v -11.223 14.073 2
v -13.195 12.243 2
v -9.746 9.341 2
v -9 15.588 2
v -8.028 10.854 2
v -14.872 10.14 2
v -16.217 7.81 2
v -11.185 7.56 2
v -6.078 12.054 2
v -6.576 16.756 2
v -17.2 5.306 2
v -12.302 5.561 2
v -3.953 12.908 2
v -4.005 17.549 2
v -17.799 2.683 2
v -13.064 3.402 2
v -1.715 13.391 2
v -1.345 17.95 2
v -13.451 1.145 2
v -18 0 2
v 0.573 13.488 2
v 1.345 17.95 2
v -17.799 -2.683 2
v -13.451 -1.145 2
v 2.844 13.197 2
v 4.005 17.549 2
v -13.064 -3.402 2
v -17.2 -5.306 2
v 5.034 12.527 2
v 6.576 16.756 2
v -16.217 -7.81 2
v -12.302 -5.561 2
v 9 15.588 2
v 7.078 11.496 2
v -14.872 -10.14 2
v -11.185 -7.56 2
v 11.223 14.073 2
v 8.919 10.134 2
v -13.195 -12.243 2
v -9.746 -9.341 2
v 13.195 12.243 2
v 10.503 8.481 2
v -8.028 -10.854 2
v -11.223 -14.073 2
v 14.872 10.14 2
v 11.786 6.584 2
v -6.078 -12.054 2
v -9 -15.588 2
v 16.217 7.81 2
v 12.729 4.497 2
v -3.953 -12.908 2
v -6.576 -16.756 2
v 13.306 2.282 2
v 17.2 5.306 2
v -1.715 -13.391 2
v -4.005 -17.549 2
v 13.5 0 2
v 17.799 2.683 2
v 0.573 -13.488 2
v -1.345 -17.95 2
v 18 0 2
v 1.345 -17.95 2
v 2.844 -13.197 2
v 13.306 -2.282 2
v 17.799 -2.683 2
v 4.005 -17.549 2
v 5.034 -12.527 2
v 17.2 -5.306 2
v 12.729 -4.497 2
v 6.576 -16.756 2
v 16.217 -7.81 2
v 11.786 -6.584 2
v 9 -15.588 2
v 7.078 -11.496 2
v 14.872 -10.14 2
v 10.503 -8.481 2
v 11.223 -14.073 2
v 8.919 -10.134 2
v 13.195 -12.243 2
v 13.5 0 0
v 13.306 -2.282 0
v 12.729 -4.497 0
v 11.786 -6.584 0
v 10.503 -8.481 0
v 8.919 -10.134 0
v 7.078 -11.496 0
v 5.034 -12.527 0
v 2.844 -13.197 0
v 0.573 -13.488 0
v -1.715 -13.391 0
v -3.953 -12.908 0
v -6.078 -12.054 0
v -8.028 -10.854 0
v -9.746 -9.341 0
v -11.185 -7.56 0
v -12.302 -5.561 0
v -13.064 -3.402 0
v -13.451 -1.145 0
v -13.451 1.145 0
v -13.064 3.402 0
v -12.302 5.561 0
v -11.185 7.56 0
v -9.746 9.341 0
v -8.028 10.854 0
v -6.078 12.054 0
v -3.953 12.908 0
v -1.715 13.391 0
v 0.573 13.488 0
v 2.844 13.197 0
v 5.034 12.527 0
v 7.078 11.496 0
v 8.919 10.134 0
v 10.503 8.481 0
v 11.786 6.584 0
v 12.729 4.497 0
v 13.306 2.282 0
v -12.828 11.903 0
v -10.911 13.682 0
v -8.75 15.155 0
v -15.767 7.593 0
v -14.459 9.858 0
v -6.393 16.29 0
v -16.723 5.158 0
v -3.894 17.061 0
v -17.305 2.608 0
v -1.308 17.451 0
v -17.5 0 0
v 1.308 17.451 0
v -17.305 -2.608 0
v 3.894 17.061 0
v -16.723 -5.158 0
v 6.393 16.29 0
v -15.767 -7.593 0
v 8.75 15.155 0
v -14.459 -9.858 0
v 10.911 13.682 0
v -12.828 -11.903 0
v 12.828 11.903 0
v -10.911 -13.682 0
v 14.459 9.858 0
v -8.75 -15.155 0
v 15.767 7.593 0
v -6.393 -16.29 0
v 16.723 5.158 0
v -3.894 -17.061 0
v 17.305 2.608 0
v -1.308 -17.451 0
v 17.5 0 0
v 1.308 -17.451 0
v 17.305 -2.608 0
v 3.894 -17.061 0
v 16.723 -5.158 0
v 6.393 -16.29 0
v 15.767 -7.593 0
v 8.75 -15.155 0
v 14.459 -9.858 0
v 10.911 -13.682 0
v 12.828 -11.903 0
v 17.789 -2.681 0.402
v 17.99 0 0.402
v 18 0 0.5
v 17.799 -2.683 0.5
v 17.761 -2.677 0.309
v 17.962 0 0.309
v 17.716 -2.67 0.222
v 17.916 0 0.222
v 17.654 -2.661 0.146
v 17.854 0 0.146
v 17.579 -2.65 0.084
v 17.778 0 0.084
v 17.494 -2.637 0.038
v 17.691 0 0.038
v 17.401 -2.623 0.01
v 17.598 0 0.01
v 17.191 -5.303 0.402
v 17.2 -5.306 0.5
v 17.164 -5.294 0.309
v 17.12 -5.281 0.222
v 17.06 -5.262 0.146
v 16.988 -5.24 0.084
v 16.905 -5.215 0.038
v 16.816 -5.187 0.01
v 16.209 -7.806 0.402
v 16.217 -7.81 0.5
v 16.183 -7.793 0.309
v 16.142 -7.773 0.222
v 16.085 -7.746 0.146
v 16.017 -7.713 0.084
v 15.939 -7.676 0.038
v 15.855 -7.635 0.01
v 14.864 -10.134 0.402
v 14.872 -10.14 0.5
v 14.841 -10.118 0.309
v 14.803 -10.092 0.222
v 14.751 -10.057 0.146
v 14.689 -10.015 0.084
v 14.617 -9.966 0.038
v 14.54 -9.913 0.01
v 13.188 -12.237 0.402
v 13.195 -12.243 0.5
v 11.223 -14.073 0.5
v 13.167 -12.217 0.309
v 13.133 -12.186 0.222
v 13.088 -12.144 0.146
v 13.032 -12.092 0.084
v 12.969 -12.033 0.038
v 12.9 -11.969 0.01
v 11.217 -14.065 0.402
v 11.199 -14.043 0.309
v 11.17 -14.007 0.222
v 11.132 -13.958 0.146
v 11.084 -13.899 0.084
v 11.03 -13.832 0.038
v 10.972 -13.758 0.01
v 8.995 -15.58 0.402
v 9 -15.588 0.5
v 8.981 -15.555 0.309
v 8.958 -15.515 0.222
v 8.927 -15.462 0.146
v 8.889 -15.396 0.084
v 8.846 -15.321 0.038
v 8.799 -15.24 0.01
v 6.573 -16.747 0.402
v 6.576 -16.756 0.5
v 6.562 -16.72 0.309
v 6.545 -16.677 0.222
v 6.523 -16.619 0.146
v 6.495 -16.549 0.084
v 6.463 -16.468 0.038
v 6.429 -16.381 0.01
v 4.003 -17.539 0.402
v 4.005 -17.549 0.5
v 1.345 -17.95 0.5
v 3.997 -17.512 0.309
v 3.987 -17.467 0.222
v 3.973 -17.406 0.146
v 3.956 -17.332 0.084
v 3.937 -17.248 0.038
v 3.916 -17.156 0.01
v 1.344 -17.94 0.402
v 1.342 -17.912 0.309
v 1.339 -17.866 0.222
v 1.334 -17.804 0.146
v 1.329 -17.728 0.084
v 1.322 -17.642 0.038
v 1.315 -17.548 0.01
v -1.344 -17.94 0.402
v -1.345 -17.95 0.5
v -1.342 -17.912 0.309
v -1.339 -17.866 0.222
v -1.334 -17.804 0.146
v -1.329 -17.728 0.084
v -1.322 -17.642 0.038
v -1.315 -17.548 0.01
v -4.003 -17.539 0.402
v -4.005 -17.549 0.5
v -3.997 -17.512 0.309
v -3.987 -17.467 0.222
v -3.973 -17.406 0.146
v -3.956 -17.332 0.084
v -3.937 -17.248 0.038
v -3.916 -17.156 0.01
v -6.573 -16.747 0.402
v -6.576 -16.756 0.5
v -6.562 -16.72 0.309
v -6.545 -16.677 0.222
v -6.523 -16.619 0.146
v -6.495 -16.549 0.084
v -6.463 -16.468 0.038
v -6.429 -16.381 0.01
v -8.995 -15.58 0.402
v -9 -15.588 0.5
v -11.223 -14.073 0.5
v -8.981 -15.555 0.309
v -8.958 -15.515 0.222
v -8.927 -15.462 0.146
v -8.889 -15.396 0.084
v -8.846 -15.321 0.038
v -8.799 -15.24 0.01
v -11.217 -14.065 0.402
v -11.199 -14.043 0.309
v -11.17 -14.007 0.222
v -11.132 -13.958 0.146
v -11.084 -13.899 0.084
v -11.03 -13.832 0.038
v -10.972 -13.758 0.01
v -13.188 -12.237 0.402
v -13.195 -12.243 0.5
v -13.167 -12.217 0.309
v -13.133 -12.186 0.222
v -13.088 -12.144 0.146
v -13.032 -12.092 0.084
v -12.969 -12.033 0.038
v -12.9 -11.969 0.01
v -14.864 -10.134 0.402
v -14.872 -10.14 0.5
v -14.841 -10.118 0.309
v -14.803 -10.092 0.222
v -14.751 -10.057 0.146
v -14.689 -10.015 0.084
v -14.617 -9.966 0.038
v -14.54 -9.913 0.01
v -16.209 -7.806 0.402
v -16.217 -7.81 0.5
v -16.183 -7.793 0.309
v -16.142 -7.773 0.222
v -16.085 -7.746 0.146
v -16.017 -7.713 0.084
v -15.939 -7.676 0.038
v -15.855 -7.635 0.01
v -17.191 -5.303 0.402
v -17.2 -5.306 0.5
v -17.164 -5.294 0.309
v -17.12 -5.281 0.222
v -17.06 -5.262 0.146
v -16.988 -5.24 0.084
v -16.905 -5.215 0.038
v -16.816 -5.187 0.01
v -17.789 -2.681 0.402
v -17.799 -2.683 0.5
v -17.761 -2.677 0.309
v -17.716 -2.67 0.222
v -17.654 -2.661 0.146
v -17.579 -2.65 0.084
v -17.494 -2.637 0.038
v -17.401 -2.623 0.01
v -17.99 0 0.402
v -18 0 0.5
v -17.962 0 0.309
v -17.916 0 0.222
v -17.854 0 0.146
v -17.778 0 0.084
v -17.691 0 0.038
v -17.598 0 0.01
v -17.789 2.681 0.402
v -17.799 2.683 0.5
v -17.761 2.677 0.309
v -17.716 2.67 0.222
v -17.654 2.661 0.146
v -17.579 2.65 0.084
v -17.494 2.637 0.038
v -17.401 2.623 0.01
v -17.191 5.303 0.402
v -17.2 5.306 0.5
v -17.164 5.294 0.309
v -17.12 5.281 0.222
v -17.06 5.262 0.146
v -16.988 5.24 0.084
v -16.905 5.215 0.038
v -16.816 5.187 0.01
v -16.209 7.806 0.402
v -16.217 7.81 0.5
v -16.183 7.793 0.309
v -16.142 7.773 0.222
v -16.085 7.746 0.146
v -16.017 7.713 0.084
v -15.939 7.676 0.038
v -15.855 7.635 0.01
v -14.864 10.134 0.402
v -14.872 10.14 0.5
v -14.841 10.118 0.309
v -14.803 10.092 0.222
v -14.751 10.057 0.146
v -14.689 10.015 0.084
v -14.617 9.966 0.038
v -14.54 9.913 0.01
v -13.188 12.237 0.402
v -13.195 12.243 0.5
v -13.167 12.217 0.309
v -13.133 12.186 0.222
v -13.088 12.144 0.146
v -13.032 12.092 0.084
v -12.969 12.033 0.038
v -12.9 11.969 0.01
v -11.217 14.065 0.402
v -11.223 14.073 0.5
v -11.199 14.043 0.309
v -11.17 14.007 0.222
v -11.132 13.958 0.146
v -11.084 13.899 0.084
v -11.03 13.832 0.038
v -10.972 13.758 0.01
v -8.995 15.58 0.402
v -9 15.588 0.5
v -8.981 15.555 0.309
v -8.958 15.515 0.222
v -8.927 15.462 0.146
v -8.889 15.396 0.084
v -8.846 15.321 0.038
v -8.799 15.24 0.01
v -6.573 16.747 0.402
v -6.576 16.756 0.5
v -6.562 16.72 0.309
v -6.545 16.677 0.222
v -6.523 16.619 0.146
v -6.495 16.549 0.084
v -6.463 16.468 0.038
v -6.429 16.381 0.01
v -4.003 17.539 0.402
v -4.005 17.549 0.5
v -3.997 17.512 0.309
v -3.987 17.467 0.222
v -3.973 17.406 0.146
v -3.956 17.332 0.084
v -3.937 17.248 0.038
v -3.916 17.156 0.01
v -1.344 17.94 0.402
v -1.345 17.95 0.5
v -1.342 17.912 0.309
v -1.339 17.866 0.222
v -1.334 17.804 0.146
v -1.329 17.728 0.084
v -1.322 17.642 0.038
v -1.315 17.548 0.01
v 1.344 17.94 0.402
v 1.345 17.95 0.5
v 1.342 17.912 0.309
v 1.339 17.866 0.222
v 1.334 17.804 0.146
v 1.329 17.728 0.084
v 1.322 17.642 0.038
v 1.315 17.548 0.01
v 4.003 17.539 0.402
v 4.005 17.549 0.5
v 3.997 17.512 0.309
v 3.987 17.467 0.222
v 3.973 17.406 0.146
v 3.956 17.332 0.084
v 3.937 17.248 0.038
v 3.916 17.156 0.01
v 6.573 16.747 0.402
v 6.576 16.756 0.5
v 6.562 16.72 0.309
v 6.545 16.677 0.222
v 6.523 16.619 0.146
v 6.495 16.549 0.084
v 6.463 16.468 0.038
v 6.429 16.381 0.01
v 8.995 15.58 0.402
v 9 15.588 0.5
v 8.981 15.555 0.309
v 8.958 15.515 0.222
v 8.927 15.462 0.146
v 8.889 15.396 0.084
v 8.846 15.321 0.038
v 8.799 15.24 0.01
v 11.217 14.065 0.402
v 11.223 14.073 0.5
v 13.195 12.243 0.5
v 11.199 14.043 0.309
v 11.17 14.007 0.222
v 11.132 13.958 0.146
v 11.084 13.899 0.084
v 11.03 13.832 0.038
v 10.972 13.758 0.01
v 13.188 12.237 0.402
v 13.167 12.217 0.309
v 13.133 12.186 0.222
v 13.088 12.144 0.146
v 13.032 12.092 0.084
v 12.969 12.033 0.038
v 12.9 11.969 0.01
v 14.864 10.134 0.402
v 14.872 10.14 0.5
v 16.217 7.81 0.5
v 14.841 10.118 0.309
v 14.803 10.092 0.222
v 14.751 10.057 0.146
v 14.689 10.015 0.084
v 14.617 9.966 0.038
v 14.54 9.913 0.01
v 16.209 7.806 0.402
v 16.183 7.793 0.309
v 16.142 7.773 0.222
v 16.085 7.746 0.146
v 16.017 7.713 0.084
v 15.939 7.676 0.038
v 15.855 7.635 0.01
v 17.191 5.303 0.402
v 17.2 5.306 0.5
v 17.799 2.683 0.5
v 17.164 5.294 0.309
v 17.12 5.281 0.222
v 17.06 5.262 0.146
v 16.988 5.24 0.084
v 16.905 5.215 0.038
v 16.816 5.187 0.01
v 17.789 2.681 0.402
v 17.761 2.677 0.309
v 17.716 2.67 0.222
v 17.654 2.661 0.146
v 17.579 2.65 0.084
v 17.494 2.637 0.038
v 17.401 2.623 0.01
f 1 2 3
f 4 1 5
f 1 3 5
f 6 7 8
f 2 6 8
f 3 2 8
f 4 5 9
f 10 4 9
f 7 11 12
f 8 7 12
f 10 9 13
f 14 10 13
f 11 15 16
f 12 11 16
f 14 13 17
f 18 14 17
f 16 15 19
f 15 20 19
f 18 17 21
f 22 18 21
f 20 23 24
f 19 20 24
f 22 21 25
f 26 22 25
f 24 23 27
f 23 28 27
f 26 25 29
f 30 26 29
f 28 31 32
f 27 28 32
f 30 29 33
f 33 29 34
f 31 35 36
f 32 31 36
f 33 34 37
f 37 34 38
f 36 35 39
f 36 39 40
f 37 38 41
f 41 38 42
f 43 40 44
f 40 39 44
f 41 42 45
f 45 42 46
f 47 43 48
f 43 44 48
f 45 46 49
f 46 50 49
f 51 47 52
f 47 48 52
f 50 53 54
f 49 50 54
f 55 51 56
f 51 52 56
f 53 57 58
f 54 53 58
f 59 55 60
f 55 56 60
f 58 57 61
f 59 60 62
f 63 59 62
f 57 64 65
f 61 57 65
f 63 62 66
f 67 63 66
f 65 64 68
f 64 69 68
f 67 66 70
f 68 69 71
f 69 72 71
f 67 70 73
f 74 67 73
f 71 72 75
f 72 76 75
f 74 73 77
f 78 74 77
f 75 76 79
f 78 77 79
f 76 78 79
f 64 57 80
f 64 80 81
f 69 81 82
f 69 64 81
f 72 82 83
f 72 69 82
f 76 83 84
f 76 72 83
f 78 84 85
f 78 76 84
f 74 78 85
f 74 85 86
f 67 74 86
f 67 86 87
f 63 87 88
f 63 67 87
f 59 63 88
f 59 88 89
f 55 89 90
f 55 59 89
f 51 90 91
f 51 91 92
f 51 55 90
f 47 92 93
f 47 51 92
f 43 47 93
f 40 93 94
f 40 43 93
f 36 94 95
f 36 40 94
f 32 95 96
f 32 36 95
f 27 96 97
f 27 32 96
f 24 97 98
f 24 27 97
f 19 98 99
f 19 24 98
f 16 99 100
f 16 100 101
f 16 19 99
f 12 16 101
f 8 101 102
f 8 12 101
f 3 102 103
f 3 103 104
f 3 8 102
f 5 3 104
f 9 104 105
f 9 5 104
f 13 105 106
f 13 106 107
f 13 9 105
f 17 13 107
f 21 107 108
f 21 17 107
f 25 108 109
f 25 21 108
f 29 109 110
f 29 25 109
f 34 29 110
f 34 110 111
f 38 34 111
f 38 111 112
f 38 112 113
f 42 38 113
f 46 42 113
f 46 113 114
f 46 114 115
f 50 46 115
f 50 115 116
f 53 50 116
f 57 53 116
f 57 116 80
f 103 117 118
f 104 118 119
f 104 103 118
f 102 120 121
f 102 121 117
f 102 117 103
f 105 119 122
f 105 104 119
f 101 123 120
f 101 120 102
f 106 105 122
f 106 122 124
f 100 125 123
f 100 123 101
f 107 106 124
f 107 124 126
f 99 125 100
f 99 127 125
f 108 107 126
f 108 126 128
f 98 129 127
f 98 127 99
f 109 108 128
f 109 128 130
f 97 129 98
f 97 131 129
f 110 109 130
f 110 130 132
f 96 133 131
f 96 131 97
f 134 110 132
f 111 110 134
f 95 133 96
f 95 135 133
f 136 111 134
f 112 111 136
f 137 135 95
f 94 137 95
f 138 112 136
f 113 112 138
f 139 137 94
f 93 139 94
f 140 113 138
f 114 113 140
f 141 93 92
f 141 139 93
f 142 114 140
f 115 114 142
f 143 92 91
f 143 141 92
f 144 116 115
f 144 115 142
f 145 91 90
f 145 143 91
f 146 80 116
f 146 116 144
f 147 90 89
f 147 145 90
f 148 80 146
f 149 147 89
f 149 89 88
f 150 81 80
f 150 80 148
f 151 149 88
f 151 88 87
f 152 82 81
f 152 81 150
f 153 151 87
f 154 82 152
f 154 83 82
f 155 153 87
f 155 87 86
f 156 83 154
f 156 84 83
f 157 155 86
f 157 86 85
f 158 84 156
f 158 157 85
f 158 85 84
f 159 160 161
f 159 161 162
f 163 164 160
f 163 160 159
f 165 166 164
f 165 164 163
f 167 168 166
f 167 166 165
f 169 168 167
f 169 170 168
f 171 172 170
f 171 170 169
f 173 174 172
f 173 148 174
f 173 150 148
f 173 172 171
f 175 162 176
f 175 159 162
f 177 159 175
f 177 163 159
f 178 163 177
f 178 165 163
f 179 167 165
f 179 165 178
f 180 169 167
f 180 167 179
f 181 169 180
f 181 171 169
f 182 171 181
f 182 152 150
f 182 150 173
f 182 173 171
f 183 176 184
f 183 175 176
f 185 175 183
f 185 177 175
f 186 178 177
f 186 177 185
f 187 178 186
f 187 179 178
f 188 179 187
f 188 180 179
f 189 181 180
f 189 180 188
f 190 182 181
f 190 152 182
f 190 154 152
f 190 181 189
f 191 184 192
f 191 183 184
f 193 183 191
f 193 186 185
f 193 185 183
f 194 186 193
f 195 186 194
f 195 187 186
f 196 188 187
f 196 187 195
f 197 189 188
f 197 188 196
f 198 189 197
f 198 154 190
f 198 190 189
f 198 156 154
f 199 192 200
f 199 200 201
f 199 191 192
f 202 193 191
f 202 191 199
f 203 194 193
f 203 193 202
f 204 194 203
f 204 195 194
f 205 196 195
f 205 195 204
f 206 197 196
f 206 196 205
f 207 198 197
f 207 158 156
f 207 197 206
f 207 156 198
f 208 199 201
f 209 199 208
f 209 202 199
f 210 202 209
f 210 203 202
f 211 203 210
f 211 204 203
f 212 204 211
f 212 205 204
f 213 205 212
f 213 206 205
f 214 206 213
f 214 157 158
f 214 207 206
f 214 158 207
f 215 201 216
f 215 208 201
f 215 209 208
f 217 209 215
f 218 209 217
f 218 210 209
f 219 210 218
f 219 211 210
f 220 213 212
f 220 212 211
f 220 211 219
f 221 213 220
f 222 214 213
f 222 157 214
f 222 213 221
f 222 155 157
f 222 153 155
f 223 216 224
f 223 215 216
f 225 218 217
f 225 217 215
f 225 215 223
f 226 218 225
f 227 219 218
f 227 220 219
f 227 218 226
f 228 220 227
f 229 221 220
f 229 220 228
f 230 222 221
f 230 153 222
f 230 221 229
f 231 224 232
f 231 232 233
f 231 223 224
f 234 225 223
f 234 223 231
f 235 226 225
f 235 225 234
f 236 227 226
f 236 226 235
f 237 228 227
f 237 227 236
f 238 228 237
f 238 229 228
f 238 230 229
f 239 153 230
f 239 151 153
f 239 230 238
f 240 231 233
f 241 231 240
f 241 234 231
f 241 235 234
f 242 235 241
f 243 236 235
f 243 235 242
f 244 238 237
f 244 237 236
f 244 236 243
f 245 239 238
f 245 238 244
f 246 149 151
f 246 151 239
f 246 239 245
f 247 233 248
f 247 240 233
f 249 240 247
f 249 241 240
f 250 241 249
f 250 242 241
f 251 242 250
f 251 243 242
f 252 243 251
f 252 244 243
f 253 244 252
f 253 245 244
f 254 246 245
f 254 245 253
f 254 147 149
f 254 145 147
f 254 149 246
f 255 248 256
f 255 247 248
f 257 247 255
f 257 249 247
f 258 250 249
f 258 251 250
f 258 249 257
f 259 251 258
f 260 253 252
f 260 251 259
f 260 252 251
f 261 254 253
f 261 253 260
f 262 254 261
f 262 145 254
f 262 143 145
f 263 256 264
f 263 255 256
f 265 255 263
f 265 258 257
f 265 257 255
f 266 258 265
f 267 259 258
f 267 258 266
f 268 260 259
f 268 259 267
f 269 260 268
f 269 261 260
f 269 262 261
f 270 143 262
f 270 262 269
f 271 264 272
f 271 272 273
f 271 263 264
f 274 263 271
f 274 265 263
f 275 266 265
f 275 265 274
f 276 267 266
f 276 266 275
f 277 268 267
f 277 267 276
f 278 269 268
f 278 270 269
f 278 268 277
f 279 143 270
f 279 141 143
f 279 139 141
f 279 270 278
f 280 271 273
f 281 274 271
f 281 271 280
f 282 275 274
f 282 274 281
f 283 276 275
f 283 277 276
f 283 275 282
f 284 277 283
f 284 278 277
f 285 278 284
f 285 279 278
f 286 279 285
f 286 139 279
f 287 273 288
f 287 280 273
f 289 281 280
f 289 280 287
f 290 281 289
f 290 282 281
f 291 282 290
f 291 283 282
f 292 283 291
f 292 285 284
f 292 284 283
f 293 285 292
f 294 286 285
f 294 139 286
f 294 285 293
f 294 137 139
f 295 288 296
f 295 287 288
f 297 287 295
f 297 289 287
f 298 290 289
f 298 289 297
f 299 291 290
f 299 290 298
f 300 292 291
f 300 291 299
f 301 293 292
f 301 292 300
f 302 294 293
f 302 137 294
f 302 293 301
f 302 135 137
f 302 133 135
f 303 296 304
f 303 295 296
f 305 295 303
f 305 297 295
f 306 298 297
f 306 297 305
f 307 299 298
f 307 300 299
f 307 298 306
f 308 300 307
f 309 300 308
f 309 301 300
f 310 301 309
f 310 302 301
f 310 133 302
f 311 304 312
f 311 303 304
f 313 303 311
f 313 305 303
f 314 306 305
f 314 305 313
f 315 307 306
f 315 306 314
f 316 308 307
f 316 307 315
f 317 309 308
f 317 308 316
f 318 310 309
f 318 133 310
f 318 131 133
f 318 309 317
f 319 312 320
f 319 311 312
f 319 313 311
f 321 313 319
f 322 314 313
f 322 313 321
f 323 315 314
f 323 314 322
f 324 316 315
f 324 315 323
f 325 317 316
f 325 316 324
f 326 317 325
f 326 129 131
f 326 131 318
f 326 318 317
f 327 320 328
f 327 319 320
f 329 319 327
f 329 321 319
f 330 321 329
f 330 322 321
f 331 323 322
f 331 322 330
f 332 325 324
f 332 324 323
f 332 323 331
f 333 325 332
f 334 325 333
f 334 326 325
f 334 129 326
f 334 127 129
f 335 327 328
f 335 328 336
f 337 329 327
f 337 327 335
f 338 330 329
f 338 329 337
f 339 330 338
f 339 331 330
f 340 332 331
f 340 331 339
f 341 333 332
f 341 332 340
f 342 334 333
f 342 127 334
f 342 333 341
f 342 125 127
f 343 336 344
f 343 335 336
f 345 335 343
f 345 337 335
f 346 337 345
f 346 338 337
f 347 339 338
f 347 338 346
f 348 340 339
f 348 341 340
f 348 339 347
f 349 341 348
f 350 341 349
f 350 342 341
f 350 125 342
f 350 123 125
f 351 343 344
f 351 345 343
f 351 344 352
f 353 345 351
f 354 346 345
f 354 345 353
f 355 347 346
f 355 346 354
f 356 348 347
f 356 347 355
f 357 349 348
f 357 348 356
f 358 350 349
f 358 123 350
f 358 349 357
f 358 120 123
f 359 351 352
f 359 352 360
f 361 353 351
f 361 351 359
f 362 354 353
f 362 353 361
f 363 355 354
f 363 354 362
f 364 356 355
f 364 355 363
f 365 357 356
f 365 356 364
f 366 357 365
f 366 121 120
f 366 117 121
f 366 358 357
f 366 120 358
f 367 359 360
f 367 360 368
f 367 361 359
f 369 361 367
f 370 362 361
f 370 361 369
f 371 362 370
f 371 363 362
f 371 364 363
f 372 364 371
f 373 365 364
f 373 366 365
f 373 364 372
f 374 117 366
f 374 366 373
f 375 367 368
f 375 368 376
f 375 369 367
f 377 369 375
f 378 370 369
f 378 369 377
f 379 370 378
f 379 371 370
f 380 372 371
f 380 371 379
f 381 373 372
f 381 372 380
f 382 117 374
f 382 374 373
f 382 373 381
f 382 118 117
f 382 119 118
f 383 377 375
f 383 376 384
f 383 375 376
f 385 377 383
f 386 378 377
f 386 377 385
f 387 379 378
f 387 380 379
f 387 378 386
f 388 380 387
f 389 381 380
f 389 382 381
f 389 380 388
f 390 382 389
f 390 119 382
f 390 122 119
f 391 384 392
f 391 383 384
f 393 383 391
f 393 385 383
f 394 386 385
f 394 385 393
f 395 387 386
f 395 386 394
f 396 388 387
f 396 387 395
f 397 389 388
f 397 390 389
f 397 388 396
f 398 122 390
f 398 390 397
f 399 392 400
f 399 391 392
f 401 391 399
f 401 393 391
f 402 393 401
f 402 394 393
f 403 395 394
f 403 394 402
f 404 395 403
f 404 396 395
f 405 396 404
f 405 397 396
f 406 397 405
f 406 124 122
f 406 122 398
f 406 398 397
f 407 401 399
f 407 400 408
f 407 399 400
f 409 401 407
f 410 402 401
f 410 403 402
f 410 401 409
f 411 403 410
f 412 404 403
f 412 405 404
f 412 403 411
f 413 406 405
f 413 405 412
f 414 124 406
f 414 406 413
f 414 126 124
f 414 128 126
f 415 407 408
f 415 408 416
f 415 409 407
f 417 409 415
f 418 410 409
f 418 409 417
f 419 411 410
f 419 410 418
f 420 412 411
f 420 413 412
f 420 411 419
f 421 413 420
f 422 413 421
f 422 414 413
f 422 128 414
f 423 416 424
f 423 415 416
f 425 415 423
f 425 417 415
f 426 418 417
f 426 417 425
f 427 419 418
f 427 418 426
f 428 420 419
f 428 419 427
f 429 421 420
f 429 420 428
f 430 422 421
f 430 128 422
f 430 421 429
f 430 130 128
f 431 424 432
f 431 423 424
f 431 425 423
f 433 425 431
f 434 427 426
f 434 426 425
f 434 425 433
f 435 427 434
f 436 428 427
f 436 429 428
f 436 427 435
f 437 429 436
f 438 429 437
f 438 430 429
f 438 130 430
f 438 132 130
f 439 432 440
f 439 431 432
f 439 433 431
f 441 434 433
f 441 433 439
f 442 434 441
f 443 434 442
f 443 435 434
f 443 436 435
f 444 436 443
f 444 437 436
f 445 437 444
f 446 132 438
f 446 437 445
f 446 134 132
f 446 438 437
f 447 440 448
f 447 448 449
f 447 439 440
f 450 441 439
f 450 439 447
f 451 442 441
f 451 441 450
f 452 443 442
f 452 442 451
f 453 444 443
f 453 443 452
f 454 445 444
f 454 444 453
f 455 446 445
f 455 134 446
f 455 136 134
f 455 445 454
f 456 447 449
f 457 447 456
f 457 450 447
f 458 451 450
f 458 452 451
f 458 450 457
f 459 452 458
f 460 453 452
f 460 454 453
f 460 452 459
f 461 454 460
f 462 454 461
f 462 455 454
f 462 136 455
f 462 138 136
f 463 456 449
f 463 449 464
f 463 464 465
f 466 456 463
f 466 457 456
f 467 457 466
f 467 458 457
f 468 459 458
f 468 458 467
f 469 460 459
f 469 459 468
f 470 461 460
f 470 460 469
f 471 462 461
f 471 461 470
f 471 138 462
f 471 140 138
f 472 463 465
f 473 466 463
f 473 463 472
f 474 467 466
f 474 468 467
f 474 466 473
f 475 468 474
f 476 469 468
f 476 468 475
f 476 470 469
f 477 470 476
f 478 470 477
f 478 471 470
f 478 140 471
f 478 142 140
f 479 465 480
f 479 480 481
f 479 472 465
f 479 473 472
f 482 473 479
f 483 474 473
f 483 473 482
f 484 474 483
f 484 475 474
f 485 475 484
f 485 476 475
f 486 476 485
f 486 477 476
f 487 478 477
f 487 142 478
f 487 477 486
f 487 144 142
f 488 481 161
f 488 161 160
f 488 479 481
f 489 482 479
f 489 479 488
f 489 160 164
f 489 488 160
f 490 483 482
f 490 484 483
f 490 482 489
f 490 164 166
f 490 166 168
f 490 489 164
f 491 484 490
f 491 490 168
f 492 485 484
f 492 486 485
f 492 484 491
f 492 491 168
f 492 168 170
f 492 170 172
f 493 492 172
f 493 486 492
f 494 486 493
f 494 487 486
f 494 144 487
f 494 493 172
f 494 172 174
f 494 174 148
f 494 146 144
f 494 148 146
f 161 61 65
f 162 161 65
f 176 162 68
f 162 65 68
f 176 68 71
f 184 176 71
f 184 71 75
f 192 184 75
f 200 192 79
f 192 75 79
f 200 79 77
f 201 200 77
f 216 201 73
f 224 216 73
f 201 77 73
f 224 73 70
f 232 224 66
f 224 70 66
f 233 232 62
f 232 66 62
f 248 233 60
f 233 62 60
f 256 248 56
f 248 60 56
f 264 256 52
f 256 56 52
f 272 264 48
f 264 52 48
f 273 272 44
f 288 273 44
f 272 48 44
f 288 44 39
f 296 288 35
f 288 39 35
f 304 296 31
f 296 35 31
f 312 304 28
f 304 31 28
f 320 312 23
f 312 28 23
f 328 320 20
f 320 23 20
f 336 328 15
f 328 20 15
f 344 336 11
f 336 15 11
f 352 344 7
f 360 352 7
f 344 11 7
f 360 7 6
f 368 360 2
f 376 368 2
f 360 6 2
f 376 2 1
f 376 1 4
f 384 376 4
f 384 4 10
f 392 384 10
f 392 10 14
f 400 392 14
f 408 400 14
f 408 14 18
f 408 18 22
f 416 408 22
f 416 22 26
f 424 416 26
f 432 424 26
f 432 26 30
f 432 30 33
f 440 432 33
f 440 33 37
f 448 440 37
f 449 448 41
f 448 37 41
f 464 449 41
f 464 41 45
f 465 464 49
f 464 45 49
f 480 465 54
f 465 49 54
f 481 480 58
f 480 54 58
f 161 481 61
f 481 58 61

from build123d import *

# Parameters (mm, degrees)
CYLINDER002_R       = 13.5
CYLINDER002_DEPTH   = 2
CYLINDER001_R       = 18
CYLINDER001_DEPTH   = 2
CUT_PLACEMENT_ANGLE = 180
FILLET_R            = 0.5


with BuildPart() as cylinder002:
    # Cylinder002 → Cylinder002 (new body)
    with BuildSketch(Plane.XY):
        Circle(CYLINDER002_R)
    extrude(amount=CYLINDER002_DEPTH)


with BuildPart() as fillet_body:
    # Cylinder001 → Cylinder001 (new body)
    with BuildSketch(Plane.XY):
        Circle(CYLINDER001_R)
    extrude(amount=CYLINDER001_DEPTH)

    # Cut: cut Cylinder002
    add(cylinder002.part, mode=Mode.SUBTRACT)


with BuildPart() as fillet_body_1:
    # Cut placement: moved
    add(fillet_body.part.moved(Location((0, 0, 2))).rotate(Axis((0, 0, 2), (1, 0, 0)), CUT_PLACEMENT_ANGLE))

    # Fillet
    fillet_edges = [fillet_body_1.edges().sort_by_distance(p)[0] for p in [
        (-18, 0, 0),
    ]]
    fillet(fillet_edges, radius=FILLET_R)


solid = fillet_body_1.part
